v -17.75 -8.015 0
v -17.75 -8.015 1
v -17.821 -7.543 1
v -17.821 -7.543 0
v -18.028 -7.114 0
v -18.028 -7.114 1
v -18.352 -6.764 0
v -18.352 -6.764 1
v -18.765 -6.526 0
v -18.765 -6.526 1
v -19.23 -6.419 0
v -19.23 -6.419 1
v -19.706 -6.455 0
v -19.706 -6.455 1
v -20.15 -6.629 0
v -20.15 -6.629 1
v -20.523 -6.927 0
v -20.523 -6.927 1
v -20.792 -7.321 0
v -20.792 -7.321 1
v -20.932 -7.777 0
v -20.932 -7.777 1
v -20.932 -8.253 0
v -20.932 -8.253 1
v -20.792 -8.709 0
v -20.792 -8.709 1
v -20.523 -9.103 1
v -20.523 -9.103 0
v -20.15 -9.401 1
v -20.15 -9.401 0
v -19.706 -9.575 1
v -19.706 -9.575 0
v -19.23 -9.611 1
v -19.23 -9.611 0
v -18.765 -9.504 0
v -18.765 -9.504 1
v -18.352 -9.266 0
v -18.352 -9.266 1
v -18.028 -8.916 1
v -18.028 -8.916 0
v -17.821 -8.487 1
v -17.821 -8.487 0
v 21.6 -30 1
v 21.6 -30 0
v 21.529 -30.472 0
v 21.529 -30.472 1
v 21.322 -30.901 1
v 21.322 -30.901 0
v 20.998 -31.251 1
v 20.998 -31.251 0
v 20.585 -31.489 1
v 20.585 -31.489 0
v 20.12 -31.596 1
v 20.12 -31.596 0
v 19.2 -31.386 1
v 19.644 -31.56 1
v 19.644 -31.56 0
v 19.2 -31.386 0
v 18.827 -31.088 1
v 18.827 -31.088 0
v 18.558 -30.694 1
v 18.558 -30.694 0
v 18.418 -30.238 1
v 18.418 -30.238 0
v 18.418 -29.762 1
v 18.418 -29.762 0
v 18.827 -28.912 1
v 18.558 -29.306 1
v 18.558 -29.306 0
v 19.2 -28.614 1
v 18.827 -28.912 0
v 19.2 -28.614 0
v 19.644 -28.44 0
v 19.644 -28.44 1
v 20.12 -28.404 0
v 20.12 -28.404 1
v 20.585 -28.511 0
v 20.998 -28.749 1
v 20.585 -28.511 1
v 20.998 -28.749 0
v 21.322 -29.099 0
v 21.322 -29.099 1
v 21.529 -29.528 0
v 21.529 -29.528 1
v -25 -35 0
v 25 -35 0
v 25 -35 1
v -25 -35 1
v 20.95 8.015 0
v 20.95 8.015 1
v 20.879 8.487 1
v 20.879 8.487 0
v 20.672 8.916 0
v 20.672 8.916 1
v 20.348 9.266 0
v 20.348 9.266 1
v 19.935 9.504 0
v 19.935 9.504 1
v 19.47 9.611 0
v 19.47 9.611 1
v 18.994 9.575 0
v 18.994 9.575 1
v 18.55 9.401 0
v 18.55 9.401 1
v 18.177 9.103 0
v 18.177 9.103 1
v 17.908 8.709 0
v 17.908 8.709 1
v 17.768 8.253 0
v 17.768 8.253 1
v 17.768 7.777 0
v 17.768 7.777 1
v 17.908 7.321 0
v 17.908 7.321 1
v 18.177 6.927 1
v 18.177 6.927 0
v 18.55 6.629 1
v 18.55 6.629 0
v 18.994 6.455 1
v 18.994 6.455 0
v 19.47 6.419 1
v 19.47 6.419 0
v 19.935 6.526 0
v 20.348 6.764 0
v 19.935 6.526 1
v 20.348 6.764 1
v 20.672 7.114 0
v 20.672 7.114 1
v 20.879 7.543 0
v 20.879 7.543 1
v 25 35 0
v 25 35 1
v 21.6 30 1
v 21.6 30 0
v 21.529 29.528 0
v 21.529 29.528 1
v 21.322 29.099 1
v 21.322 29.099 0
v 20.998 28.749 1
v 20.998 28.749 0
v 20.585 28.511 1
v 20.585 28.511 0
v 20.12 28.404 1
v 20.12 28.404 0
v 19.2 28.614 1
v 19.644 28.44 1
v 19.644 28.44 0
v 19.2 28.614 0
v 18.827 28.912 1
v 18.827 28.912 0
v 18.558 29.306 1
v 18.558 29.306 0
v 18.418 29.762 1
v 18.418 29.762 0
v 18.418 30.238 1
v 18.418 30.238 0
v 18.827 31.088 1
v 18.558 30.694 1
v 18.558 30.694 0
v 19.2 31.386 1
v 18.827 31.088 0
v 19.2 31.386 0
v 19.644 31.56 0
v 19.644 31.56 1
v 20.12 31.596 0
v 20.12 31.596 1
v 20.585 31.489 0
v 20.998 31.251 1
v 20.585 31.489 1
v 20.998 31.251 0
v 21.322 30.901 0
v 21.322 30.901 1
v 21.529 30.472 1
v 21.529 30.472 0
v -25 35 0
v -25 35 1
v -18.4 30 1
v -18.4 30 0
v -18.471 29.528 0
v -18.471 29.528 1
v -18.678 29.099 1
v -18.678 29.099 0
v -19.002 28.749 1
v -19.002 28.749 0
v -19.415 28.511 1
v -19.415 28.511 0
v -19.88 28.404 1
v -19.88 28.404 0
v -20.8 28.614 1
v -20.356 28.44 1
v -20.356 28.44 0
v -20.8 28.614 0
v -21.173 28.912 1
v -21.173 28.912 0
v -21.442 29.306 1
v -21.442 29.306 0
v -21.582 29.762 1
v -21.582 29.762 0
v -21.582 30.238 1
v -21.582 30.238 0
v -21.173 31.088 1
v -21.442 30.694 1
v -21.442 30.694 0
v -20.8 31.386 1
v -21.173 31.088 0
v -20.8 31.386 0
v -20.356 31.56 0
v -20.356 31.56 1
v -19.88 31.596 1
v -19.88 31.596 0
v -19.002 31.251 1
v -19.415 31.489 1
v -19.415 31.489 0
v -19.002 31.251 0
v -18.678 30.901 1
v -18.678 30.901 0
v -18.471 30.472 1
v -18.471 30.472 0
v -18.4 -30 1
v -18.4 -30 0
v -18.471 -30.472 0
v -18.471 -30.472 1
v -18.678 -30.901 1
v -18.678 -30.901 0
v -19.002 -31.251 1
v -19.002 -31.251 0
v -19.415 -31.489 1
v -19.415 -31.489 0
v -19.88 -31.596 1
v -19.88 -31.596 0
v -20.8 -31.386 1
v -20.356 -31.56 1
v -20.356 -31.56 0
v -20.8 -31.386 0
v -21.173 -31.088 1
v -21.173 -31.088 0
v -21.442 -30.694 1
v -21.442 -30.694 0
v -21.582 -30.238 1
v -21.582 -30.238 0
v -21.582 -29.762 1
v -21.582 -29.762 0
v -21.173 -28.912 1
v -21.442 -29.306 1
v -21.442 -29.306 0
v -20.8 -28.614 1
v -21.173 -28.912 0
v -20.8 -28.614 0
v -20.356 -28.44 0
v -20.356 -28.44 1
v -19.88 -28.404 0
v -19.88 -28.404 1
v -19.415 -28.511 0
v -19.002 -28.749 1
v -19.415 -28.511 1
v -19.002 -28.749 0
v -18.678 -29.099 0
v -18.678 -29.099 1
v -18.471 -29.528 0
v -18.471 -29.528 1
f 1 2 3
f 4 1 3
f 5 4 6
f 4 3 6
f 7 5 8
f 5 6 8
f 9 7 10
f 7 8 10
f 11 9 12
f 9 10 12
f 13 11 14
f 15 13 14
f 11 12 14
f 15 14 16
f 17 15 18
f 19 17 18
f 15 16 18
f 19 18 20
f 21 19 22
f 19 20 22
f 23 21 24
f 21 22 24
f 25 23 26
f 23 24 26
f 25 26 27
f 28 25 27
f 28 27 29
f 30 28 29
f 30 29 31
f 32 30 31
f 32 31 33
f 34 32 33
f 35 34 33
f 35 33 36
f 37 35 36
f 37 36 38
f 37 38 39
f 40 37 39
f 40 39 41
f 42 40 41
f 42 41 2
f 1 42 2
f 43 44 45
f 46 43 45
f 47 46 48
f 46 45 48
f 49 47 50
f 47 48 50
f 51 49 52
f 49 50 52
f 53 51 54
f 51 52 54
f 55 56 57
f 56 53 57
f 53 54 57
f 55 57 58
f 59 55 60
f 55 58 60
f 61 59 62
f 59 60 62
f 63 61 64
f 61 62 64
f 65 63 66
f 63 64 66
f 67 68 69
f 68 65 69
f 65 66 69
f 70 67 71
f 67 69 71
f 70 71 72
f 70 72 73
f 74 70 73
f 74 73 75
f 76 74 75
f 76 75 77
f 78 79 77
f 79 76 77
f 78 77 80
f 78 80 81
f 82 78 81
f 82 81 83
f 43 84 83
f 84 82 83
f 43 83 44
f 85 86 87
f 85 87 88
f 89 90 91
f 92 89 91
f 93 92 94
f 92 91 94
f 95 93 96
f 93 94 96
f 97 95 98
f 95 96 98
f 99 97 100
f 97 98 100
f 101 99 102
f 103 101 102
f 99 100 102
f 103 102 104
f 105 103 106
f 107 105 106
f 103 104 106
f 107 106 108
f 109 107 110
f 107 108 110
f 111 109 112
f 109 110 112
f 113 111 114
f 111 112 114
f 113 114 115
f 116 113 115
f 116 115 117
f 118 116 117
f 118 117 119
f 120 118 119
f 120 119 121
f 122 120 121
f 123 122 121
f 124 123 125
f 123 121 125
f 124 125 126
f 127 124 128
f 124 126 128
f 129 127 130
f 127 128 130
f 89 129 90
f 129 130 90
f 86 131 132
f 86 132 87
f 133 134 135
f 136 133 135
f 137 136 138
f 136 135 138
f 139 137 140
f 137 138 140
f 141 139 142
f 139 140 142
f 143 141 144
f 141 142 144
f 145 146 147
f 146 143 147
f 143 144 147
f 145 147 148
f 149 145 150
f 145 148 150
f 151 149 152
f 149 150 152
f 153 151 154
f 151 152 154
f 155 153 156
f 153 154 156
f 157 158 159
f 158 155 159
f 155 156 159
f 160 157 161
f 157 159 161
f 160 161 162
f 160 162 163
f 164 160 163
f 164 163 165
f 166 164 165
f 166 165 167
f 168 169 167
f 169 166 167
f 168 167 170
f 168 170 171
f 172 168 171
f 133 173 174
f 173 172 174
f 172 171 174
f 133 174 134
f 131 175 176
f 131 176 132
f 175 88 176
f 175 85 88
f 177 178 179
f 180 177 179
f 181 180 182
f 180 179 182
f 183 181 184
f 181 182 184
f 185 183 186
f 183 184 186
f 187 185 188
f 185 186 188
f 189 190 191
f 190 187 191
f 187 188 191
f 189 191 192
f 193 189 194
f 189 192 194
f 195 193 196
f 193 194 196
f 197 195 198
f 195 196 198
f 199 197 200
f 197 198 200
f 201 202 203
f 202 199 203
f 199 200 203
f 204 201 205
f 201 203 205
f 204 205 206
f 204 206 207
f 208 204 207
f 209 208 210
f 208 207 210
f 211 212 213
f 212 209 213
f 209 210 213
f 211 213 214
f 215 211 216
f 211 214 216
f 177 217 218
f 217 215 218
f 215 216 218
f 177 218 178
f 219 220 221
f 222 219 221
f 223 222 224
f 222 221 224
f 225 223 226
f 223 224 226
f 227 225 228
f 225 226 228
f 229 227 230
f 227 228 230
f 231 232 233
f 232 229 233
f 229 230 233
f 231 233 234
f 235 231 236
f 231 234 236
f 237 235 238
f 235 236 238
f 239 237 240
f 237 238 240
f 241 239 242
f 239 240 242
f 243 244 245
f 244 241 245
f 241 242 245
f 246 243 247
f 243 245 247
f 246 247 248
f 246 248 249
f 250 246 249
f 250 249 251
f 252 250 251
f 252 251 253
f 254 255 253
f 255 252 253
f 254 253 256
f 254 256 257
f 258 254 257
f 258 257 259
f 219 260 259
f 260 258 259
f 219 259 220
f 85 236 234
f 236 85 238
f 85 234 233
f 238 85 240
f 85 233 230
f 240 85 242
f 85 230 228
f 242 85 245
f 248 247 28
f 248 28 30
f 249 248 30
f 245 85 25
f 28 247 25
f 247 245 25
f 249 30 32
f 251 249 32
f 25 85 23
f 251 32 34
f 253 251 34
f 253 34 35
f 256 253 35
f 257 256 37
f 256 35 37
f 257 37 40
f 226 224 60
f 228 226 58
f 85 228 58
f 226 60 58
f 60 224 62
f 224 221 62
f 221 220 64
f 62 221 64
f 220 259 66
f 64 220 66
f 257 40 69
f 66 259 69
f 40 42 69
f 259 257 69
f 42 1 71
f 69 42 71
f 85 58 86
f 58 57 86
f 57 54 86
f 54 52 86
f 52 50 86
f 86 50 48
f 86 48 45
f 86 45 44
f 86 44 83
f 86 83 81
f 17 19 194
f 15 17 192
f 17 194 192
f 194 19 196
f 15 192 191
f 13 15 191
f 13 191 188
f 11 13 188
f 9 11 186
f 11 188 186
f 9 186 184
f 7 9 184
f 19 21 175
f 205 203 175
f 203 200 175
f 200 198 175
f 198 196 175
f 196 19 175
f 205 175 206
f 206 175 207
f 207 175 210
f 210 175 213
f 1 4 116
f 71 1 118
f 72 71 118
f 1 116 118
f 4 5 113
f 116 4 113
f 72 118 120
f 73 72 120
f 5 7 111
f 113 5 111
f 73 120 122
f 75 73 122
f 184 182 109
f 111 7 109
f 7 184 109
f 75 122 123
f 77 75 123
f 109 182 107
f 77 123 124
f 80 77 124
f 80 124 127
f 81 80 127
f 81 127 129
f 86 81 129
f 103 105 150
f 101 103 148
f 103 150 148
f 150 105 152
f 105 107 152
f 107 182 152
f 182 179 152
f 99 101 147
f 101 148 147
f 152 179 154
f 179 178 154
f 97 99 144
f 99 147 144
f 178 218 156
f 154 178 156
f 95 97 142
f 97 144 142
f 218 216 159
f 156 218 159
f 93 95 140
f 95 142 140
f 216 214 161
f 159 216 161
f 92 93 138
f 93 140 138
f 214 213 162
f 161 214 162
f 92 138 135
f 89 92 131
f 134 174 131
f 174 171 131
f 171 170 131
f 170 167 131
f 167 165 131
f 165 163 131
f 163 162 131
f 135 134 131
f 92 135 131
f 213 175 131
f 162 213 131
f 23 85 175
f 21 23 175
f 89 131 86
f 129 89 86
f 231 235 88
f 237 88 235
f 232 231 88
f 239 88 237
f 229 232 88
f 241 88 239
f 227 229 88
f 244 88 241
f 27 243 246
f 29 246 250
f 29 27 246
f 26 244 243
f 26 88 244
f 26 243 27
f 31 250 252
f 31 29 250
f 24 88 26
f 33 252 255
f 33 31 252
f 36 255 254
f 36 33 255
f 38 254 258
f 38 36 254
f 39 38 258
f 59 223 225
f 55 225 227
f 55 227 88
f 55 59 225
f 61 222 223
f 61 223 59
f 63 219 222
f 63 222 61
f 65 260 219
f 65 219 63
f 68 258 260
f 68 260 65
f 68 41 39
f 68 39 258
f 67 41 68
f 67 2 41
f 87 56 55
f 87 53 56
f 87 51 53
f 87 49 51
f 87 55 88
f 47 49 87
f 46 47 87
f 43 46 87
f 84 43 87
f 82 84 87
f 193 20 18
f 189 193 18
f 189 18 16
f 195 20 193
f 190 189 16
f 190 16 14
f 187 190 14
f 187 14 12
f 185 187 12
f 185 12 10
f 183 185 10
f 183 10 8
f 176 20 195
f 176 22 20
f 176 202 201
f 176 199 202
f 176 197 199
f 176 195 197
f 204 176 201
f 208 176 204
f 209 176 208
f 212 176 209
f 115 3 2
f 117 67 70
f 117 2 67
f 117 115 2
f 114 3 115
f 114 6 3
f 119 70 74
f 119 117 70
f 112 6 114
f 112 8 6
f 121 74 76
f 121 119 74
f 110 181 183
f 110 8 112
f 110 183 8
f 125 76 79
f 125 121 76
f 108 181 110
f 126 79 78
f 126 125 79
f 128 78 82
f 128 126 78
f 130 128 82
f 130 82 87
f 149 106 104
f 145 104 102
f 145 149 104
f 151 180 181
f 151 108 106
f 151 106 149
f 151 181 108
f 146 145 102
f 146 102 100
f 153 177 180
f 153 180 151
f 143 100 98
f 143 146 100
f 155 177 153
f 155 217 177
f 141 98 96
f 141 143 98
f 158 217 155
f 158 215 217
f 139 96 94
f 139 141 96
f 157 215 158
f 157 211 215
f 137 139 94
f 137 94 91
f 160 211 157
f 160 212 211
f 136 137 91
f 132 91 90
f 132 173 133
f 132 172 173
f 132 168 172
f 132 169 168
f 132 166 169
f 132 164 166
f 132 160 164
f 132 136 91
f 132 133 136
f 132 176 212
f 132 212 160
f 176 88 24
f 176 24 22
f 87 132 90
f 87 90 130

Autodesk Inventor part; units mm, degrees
ref_plane "YZ Plane" through (0, 0, 0) normal (1, 0, 0) x (0, 1, 0)
ref_plane "XZ Plane" through (0, 0, 0) normal (0, 1, 0) x (-1, 0, 0)
ref_plane "XY Plane" through (0, 0, 0) normal (0, 0, 1) x (1, 0, 0)
sketch "Sketch1" plane through (0, 0, 0) normal (0, 0, 1) x (1, 0, 0)
  line L0 (-25, 35) -> (25, 35)
  line L1 (25, 35) -> (25, -35)
  line L2 (25, -35) -> (-25, -35)
  line L3 (-25, -35) -> (-25, 35)
  line L4 (-25, 35) -> (25, -35) construction
  line L5 (25, 35) -> (-25, -35) construction
  circle A0 centre (-20, 30) radius 1.6
  line L6 (0, 0) -> (0, 8.6163)
  line L7 (0, 0) -> (6.049, 0)
  circle A1 centre (20, 30) radius 1.6
  circle A2 centre (-20, -30) radius 1.6
  circle A3 centre (20, -30) radius 1.6
  dimension "d0" = 50
  dimension "d1" = 70
  dimension "d12" = 3.2
  dimension "d13" = 5
  dimension "d18" = 5
extrude "Plate1" add sketch "Sketch1" along normal blind 1
sketch "Sketch2" plane through (0, 0, 1) normal (0, 0, 1) x (1, 0, 0)
  line L0 (22.55, 9.3405) -> (22.55, -9.3405)
  line L1 (22.55, -9.3405) -> (9.3405, -22.55)
  line L2 (9.3405, -22.55) -> (-9.3405, -22.55)
  line L3 (-9.3405, -22.55) -> (-22.55, -9.3405)
  line L4 (-22.55, -9.3405) -> (-22.55, 9.3405)
  line L5 (-22.55, 9.3405) -> (-9.3405, 22.55)
  line L6 (-9.3405, 22.55) -> (9.3405, 22.55)
  line L7 (9.3405, 22.55) -> (22.55, 9.3405)
  circle A0 centre (19.35, 8.015) radius 1.6
  line L8 (22.55, 9.3405) -> (-22.55, -9.3405)
  circle A1 centre (-19.35, -8.015) radius 1.6
  point P0 (0, 0)
  point P1 (0, 0)
  dimension "d3" = 45.1
  dimension "d4" = 3.2
  dimension "d5" = 3.2
  dimension "d8" = 360
extrude "Extrusion1" cut sketch "Sketch2" against normal blind 10 contours L8 A0 | A0 L8 | A1 L8 | L8 A1
equation "\"d2\" = 厚度"
equation "\"折彎半徑\" = 厚度"
equation "\"折彎離隙寬度\" = 厚度"
equation "\"折彎離隙深度\" = 0.5 * 厚度"
equation "\"轉角離隙大小\" = 4 * 厚度"
equation "\"最小剩餘\" = 2 * 厚度"
equation "\"轉移半徑\" = 折彎半徑"
equation "\"Jacobi半徑大小\" = 折彎半徑"
equation "\"間隙大小\" = 厚度"
equation "\"厚度\" = 1"
properties part number "signal_combiner_plate" material "Aluminum"
